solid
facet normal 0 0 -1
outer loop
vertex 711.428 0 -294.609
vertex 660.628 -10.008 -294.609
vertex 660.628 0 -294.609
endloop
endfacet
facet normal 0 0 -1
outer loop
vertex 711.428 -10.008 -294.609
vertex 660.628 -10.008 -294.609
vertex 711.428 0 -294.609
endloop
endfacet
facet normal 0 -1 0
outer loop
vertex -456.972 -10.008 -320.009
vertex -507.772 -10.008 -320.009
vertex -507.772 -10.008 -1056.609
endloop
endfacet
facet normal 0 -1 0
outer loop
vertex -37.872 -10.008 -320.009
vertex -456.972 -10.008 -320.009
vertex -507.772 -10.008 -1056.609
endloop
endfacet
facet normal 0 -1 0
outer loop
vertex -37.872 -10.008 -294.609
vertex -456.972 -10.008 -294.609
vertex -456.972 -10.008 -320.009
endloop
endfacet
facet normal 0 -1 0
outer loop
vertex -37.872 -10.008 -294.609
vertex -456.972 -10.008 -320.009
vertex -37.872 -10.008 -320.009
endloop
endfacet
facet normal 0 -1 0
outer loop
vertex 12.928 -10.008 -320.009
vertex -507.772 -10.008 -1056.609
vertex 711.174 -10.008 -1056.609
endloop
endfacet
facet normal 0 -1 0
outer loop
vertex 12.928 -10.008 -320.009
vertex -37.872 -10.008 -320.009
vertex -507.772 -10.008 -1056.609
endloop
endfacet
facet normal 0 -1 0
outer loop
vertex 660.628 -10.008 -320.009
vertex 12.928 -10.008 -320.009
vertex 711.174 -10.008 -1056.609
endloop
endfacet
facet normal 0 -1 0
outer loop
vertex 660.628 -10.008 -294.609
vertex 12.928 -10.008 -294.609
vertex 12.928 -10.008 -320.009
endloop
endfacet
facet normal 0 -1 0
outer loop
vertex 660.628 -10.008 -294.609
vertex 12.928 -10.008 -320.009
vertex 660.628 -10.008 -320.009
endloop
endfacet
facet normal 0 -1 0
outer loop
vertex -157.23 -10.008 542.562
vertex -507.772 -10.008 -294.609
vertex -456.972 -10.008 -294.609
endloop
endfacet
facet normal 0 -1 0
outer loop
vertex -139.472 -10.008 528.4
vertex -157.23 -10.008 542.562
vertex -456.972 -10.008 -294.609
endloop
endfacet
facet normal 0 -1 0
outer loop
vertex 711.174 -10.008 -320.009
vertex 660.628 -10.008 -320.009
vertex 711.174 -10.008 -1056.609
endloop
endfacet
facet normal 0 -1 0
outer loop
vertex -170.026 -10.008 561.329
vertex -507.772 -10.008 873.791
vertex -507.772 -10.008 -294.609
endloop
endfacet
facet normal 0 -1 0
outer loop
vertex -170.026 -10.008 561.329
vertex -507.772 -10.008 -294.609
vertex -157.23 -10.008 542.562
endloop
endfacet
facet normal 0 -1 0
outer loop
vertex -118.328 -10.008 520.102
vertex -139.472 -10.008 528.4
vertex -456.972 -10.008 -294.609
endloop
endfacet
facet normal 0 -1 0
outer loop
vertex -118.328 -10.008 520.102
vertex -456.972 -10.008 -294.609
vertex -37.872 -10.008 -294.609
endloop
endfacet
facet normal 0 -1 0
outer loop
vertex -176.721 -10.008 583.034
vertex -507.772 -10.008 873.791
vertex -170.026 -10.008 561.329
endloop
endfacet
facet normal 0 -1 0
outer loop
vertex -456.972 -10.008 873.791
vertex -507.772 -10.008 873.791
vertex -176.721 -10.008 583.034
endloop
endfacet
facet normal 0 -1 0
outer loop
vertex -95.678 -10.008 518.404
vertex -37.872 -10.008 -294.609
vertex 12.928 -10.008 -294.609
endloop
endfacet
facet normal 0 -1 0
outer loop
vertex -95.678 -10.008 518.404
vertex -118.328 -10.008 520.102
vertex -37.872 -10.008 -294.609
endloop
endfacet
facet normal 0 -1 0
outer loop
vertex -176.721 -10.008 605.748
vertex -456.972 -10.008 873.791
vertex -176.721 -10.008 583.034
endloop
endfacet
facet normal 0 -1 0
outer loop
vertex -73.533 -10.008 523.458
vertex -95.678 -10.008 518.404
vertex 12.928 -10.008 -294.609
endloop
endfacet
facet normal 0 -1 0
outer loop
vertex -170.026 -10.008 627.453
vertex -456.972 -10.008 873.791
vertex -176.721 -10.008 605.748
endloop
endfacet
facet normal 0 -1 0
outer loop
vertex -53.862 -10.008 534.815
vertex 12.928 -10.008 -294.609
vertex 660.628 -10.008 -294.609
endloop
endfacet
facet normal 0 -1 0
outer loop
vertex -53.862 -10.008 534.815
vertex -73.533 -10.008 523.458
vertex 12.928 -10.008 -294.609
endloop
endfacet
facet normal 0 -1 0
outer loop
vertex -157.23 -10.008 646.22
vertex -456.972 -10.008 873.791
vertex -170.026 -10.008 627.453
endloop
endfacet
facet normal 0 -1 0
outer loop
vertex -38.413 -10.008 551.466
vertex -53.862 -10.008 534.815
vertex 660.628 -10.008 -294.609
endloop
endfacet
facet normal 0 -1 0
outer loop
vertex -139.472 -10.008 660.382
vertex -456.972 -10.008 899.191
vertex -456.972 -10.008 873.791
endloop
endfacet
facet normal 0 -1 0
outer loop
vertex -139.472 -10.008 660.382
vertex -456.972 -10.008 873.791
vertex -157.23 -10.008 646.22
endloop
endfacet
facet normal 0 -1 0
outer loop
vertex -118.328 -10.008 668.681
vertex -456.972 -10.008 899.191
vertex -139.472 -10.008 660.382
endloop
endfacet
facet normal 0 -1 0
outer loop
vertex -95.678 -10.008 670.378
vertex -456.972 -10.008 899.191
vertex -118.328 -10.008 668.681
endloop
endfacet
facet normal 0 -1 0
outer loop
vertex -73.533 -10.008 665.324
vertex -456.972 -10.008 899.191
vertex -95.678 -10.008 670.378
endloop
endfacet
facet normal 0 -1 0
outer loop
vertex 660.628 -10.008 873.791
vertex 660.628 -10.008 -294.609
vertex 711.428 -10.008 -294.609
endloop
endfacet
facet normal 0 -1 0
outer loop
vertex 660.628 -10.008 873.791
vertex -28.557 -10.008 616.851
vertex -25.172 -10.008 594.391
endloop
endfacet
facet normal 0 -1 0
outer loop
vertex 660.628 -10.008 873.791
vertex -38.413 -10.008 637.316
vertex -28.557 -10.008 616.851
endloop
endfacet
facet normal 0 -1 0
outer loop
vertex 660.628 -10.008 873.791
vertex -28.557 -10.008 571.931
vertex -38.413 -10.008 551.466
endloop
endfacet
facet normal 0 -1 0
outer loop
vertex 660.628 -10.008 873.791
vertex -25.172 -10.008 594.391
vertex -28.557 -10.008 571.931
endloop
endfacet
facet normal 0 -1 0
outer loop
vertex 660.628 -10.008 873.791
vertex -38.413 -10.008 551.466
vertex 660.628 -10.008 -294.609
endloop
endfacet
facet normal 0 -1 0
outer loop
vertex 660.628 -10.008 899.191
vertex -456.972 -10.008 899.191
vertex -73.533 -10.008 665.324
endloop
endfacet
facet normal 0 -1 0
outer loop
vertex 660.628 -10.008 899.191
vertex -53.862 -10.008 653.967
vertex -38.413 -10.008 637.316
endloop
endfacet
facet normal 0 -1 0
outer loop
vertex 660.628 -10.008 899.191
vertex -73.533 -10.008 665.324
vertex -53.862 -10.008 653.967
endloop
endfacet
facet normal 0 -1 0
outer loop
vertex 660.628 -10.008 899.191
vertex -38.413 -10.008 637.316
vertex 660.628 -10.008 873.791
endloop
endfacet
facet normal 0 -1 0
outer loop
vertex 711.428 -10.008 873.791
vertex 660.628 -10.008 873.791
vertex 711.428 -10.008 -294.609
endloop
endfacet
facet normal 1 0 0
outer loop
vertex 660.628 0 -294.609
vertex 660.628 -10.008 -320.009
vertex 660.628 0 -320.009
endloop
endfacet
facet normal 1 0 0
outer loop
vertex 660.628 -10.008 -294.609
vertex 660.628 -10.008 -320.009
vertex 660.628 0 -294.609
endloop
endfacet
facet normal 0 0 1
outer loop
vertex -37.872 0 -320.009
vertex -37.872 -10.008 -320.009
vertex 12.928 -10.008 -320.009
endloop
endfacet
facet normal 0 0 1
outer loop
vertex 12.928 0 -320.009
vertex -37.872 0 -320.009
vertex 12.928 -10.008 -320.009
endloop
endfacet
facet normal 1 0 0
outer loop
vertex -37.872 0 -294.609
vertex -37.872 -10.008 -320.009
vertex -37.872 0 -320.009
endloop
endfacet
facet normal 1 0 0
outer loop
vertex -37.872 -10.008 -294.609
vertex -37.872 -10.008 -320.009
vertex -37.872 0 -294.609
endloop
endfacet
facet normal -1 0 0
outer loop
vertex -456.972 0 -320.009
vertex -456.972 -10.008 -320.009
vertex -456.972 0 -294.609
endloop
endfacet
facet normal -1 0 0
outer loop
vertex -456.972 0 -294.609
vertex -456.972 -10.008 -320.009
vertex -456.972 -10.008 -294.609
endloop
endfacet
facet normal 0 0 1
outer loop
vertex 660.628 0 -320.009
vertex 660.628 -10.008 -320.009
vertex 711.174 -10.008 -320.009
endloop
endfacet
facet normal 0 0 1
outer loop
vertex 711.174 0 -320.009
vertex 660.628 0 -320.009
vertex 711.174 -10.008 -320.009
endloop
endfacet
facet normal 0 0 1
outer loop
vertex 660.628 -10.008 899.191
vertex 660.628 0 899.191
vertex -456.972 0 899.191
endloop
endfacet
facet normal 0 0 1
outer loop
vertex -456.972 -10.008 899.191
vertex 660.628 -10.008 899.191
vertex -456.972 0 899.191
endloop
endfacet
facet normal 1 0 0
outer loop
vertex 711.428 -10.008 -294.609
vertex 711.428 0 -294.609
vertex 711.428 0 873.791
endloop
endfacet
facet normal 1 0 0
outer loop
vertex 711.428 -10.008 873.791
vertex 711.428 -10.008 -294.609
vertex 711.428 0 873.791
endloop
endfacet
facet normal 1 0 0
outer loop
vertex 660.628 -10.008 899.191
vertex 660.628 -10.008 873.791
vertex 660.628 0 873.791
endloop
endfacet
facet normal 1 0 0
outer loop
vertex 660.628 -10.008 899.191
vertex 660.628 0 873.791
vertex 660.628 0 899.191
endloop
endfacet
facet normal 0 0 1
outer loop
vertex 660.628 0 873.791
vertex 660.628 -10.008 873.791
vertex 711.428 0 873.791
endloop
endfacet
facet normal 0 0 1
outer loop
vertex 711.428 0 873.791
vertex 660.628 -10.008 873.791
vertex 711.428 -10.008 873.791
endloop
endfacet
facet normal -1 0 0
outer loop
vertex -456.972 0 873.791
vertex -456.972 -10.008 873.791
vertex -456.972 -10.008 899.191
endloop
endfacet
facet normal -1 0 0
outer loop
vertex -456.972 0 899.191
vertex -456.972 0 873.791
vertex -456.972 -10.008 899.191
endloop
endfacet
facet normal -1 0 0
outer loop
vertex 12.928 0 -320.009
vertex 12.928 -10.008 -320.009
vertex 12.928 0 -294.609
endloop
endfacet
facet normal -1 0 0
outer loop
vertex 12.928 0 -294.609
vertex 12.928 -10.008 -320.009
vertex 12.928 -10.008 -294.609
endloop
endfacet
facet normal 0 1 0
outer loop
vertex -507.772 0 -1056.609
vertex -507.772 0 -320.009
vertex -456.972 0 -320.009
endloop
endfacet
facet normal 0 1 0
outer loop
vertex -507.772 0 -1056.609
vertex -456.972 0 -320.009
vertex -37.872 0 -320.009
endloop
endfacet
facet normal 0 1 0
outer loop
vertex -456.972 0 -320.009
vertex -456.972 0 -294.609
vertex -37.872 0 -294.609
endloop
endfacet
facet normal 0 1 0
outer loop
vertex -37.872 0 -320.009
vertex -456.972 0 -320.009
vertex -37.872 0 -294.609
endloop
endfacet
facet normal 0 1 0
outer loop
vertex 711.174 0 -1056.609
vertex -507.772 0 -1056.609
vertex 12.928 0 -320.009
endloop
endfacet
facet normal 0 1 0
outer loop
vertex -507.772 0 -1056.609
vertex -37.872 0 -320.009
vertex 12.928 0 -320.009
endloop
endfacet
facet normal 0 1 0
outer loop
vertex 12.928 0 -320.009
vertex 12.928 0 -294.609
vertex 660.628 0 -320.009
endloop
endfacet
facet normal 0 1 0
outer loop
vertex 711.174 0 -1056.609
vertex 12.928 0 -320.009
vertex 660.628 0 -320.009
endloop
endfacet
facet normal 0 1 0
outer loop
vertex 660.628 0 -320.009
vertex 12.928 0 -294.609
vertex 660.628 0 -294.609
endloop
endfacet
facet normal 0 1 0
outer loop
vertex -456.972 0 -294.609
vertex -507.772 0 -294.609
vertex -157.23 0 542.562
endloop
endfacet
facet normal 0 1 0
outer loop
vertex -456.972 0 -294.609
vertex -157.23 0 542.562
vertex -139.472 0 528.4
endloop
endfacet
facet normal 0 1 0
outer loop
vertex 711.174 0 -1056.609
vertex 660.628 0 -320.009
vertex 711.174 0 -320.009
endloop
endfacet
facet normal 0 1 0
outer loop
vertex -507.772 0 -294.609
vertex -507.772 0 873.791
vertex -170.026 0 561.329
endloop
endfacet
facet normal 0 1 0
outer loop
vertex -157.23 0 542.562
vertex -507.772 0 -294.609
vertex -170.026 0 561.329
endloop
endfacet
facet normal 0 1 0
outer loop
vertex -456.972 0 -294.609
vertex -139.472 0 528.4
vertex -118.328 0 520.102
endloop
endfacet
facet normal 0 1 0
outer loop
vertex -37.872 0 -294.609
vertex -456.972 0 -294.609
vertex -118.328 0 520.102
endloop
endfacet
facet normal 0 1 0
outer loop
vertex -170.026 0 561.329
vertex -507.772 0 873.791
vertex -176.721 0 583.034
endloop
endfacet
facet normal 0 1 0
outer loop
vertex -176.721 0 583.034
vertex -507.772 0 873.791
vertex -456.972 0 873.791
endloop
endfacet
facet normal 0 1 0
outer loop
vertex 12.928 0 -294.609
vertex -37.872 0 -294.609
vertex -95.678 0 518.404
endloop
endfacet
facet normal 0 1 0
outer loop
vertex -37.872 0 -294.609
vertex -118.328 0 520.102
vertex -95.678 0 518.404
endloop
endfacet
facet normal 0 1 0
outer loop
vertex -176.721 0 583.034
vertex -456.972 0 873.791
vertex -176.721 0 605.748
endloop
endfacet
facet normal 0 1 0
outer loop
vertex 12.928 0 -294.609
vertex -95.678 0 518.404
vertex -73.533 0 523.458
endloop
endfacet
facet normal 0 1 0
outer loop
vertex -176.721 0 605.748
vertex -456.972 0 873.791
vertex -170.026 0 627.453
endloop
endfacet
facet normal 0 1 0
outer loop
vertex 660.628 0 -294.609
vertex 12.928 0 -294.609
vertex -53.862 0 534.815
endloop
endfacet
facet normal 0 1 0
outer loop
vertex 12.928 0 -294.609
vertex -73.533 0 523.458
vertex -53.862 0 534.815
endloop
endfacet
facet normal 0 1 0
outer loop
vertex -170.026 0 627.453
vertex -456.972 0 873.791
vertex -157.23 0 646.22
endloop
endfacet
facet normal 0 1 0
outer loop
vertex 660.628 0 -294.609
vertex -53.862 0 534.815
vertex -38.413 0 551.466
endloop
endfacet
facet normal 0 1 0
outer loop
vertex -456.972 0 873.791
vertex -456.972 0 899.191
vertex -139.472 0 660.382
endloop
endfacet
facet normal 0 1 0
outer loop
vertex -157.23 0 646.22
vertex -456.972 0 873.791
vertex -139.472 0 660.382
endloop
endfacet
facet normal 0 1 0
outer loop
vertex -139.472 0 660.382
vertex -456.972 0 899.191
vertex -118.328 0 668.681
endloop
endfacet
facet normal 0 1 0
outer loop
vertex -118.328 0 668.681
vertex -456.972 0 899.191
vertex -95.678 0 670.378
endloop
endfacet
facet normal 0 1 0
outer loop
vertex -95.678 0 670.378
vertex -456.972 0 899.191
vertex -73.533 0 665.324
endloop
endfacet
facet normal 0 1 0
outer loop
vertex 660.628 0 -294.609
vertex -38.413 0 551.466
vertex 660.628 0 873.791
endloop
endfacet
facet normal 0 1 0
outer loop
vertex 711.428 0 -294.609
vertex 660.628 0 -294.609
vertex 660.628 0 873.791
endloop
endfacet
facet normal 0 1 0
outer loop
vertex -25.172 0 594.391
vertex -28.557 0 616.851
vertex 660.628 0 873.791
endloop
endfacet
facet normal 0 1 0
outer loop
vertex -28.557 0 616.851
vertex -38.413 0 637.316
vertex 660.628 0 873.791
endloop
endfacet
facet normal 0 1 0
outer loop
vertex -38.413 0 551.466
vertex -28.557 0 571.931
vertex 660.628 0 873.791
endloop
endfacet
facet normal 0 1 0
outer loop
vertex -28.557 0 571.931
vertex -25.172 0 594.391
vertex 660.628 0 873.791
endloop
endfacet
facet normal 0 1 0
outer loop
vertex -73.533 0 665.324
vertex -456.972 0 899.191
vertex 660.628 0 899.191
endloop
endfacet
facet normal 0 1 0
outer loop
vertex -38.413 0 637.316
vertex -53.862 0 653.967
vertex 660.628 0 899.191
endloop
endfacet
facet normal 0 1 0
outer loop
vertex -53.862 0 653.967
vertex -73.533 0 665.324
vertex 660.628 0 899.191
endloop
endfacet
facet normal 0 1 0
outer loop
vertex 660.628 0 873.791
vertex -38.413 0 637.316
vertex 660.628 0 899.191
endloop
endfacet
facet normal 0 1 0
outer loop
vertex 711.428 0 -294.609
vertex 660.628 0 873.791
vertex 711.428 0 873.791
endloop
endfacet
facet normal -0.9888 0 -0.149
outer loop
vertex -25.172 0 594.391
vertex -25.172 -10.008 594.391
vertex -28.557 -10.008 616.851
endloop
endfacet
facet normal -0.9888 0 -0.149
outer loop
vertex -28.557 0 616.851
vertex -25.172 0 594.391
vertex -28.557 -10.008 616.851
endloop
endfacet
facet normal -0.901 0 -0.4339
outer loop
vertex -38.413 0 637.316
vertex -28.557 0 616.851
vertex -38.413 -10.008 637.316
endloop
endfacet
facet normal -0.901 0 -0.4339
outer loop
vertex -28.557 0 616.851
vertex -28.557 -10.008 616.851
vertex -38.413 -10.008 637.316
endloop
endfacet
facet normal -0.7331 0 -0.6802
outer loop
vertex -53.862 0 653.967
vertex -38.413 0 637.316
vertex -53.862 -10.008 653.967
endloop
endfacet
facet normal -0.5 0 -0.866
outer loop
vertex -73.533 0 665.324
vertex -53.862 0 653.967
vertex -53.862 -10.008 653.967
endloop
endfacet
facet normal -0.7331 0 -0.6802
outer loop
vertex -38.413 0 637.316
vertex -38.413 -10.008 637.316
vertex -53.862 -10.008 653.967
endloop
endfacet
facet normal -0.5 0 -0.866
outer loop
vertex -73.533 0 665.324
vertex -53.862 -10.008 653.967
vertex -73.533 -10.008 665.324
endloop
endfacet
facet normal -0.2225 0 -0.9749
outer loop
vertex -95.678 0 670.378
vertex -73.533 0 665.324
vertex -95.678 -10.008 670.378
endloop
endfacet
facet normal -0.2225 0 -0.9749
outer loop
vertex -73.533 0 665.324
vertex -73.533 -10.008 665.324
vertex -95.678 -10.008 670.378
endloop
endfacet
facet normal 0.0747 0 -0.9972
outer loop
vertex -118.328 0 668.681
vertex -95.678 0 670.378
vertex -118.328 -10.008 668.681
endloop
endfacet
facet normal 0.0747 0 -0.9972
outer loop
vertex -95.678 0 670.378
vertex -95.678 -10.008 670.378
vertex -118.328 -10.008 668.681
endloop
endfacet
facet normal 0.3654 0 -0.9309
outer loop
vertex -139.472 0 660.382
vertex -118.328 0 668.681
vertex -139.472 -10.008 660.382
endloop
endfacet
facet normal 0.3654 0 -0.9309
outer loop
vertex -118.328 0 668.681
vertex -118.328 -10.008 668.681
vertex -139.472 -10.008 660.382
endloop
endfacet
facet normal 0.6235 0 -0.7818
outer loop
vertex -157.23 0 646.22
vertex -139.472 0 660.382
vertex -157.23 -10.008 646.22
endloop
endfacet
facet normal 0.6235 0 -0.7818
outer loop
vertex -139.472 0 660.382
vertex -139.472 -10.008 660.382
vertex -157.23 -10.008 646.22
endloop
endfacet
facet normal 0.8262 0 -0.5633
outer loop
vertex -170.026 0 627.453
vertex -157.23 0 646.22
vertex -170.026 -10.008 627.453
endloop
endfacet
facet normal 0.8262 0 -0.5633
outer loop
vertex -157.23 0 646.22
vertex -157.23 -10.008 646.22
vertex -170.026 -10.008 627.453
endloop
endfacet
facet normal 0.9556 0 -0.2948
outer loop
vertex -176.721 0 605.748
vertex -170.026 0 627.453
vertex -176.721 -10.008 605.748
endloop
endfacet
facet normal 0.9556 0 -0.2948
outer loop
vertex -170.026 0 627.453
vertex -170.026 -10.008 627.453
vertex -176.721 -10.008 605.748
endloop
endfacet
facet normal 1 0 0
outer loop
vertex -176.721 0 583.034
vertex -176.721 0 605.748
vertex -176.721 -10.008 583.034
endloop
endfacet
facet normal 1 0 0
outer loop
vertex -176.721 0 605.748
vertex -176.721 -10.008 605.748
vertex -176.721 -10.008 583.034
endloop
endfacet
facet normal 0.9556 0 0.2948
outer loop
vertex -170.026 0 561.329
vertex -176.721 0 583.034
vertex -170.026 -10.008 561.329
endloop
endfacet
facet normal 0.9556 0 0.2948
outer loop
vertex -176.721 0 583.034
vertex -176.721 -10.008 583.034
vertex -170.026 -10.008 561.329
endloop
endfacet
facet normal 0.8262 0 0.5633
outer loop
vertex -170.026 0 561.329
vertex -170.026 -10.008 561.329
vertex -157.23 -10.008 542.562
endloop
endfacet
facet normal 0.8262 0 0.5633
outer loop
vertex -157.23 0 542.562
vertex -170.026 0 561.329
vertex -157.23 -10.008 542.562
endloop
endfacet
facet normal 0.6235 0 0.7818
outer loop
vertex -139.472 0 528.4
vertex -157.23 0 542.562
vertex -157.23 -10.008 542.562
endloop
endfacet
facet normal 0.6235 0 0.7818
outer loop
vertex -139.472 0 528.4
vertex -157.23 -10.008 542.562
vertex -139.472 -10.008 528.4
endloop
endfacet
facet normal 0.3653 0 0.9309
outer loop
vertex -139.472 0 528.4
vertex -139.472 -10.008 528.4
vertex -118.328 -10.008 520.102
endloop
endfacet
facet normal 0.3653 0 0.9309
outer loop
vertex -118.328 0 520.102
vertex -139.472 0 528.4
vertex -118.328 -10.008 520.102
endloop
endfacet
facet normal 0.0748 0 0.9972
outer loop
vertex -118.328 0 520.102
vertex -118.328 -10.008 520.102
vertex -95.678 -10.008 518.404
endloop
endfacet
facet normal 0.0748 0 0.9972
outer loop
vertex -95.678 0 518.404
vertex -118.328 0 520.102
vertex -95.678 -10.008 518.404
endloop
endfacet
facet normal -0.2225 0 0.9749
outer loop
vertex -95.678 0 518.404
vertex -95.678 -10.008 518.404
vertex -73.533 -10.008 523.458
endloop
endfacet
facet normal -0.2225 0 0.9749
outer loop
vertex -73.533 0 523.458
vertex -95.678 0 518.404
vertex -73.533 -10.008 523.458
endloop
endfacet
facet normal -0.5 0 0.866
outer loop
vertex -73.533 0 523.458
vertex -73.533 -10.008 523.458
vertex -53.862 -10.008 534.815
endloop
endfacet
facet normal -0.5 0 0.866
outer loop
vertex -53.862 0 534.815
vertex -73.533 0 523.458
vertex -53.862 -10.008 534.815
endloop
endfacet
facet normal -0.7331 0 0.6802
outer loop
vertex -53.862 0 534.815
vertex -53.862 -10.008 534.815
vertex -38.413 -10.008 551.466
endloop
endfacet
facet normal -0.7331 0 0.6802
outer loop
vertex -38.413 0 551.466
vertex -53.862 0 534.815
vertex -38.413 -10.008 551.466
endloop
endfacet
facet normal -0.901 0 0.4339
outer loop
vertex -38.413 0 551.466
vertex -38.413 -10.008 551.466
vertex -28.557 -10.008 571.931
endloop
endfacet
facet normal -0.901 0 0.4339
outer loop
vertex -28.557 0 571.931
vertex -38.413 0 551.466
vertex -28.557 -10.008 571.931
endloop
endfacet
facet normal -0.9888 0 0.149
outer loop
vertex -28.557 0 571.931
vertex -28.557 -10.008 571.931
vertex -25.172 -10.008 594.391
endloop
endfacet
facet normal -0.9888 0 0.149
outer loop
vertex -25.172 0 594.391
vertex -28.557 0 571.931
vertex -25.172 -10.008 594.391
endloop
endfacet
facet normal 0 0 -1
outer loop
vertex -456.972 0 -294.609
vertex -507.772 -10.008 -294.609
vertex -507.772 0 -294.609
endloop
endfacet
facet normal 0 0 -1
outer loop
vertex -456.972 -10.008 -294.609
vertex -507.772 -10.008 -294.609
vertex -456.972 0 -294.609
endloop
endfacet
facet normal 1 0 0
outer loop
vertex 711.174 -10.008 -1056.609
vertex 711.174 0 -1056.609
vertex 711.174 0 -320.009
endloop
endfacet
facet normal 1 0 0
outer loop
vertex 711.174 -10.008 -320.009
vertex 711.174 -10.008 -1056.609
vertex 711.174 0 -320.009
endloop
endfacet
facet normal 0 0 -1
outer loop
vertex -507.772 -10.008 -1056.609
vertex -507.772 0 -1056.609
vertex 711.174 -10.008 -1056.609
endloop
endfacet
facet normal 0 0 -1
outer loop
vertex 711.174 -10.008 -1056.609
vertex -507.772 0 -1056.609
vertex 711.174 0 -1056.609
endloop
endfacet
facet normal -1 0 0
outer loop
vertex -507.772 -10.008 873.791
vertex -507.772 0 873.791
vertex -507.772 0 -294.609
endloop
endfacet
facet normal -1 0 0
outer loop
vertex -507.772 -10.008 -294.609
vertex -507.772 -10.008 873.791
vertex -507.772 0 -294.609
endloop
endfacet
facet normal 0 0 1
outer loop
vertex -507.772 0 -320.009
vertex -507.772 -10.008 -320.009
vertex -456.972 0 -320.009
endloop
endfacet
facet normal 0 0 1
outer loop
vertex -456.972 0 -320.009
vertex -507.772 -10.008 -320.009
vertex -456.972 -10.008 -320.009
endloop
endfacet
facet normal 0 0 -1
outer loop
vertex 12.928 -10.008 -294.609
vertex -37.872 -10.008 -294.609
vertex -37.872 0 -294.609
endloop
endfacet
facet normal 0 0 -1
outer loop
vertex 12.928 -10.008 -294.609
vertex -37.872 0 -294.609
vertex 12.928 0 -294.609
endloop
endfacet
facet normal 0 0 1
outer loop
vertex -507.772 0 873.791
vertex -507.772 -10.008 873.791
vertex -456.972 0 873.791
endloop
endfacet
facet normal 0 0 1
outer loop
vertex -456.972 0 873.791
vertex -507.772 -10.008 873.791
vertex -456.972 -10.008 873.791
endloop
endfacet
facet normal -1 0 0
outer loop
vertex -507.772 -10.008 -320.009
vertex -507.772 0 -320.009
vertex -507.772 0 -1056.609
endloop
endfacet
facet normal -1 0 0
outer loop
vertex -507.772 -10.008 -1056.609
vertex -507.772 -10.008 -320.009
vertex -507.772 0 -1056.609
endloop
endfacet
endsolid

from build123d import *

# Parameters (mm, degrees)
F1_DEPTH = 10.0076
F2_W     = 50.8
F2_H     = 25.4
F3_DEPTH = 10.0086
F4_R     = 76.2
F5_DEPTH = 10.0086


with BuildPart() as f1:
    # F0 (on Front) → F1 (new body)
    with BuildSketch(Plane.XZ):
        Polygon((711.428056, 899.191029), (-507.771944, 899.191029), (-507.771944, -1056.608971), (711.174056, -1056.608971), (711.174056, -320.008971), (711.428056, -320.008971), align=None)
    extrude(amount=F1_DEPTH)

    # F2 (on face) → F3 (cut, through all)
    with BuildSketch(Plane.XZ.offset(10.0076)):
        with Locations((686.028056, 886.491029)):
            Rectangle(F2_W, F2_H)
        with Locations((-482.371944, 886.491029)):
            Rectangle(F2_W, F2_H)
        with Locations((686.028056, -307.308971)):
            Rectangle(F2_W, F2_H)
        with Locations((-482.371944, -307.308971)):
            Rectangle(F2_W, F2_H)
        with Locations((-12.471944, -307.308971)):
            Rectangle(F2_W, F2_H)
    extrude(amount=-F3_DEPTH, mode=Mode.SUBTRACT)

    # F4 (on face) → F5 (cut, through all)
    with BuildSketch(Plane.XZ.offset(10.0076)):
        with Locations((-101.371944, 594.391029)):
            Circle(F4_R)
    extrude(amount=-F5_DEPTH, mode=Mode.SUBTRACT)


solid = f1.part
